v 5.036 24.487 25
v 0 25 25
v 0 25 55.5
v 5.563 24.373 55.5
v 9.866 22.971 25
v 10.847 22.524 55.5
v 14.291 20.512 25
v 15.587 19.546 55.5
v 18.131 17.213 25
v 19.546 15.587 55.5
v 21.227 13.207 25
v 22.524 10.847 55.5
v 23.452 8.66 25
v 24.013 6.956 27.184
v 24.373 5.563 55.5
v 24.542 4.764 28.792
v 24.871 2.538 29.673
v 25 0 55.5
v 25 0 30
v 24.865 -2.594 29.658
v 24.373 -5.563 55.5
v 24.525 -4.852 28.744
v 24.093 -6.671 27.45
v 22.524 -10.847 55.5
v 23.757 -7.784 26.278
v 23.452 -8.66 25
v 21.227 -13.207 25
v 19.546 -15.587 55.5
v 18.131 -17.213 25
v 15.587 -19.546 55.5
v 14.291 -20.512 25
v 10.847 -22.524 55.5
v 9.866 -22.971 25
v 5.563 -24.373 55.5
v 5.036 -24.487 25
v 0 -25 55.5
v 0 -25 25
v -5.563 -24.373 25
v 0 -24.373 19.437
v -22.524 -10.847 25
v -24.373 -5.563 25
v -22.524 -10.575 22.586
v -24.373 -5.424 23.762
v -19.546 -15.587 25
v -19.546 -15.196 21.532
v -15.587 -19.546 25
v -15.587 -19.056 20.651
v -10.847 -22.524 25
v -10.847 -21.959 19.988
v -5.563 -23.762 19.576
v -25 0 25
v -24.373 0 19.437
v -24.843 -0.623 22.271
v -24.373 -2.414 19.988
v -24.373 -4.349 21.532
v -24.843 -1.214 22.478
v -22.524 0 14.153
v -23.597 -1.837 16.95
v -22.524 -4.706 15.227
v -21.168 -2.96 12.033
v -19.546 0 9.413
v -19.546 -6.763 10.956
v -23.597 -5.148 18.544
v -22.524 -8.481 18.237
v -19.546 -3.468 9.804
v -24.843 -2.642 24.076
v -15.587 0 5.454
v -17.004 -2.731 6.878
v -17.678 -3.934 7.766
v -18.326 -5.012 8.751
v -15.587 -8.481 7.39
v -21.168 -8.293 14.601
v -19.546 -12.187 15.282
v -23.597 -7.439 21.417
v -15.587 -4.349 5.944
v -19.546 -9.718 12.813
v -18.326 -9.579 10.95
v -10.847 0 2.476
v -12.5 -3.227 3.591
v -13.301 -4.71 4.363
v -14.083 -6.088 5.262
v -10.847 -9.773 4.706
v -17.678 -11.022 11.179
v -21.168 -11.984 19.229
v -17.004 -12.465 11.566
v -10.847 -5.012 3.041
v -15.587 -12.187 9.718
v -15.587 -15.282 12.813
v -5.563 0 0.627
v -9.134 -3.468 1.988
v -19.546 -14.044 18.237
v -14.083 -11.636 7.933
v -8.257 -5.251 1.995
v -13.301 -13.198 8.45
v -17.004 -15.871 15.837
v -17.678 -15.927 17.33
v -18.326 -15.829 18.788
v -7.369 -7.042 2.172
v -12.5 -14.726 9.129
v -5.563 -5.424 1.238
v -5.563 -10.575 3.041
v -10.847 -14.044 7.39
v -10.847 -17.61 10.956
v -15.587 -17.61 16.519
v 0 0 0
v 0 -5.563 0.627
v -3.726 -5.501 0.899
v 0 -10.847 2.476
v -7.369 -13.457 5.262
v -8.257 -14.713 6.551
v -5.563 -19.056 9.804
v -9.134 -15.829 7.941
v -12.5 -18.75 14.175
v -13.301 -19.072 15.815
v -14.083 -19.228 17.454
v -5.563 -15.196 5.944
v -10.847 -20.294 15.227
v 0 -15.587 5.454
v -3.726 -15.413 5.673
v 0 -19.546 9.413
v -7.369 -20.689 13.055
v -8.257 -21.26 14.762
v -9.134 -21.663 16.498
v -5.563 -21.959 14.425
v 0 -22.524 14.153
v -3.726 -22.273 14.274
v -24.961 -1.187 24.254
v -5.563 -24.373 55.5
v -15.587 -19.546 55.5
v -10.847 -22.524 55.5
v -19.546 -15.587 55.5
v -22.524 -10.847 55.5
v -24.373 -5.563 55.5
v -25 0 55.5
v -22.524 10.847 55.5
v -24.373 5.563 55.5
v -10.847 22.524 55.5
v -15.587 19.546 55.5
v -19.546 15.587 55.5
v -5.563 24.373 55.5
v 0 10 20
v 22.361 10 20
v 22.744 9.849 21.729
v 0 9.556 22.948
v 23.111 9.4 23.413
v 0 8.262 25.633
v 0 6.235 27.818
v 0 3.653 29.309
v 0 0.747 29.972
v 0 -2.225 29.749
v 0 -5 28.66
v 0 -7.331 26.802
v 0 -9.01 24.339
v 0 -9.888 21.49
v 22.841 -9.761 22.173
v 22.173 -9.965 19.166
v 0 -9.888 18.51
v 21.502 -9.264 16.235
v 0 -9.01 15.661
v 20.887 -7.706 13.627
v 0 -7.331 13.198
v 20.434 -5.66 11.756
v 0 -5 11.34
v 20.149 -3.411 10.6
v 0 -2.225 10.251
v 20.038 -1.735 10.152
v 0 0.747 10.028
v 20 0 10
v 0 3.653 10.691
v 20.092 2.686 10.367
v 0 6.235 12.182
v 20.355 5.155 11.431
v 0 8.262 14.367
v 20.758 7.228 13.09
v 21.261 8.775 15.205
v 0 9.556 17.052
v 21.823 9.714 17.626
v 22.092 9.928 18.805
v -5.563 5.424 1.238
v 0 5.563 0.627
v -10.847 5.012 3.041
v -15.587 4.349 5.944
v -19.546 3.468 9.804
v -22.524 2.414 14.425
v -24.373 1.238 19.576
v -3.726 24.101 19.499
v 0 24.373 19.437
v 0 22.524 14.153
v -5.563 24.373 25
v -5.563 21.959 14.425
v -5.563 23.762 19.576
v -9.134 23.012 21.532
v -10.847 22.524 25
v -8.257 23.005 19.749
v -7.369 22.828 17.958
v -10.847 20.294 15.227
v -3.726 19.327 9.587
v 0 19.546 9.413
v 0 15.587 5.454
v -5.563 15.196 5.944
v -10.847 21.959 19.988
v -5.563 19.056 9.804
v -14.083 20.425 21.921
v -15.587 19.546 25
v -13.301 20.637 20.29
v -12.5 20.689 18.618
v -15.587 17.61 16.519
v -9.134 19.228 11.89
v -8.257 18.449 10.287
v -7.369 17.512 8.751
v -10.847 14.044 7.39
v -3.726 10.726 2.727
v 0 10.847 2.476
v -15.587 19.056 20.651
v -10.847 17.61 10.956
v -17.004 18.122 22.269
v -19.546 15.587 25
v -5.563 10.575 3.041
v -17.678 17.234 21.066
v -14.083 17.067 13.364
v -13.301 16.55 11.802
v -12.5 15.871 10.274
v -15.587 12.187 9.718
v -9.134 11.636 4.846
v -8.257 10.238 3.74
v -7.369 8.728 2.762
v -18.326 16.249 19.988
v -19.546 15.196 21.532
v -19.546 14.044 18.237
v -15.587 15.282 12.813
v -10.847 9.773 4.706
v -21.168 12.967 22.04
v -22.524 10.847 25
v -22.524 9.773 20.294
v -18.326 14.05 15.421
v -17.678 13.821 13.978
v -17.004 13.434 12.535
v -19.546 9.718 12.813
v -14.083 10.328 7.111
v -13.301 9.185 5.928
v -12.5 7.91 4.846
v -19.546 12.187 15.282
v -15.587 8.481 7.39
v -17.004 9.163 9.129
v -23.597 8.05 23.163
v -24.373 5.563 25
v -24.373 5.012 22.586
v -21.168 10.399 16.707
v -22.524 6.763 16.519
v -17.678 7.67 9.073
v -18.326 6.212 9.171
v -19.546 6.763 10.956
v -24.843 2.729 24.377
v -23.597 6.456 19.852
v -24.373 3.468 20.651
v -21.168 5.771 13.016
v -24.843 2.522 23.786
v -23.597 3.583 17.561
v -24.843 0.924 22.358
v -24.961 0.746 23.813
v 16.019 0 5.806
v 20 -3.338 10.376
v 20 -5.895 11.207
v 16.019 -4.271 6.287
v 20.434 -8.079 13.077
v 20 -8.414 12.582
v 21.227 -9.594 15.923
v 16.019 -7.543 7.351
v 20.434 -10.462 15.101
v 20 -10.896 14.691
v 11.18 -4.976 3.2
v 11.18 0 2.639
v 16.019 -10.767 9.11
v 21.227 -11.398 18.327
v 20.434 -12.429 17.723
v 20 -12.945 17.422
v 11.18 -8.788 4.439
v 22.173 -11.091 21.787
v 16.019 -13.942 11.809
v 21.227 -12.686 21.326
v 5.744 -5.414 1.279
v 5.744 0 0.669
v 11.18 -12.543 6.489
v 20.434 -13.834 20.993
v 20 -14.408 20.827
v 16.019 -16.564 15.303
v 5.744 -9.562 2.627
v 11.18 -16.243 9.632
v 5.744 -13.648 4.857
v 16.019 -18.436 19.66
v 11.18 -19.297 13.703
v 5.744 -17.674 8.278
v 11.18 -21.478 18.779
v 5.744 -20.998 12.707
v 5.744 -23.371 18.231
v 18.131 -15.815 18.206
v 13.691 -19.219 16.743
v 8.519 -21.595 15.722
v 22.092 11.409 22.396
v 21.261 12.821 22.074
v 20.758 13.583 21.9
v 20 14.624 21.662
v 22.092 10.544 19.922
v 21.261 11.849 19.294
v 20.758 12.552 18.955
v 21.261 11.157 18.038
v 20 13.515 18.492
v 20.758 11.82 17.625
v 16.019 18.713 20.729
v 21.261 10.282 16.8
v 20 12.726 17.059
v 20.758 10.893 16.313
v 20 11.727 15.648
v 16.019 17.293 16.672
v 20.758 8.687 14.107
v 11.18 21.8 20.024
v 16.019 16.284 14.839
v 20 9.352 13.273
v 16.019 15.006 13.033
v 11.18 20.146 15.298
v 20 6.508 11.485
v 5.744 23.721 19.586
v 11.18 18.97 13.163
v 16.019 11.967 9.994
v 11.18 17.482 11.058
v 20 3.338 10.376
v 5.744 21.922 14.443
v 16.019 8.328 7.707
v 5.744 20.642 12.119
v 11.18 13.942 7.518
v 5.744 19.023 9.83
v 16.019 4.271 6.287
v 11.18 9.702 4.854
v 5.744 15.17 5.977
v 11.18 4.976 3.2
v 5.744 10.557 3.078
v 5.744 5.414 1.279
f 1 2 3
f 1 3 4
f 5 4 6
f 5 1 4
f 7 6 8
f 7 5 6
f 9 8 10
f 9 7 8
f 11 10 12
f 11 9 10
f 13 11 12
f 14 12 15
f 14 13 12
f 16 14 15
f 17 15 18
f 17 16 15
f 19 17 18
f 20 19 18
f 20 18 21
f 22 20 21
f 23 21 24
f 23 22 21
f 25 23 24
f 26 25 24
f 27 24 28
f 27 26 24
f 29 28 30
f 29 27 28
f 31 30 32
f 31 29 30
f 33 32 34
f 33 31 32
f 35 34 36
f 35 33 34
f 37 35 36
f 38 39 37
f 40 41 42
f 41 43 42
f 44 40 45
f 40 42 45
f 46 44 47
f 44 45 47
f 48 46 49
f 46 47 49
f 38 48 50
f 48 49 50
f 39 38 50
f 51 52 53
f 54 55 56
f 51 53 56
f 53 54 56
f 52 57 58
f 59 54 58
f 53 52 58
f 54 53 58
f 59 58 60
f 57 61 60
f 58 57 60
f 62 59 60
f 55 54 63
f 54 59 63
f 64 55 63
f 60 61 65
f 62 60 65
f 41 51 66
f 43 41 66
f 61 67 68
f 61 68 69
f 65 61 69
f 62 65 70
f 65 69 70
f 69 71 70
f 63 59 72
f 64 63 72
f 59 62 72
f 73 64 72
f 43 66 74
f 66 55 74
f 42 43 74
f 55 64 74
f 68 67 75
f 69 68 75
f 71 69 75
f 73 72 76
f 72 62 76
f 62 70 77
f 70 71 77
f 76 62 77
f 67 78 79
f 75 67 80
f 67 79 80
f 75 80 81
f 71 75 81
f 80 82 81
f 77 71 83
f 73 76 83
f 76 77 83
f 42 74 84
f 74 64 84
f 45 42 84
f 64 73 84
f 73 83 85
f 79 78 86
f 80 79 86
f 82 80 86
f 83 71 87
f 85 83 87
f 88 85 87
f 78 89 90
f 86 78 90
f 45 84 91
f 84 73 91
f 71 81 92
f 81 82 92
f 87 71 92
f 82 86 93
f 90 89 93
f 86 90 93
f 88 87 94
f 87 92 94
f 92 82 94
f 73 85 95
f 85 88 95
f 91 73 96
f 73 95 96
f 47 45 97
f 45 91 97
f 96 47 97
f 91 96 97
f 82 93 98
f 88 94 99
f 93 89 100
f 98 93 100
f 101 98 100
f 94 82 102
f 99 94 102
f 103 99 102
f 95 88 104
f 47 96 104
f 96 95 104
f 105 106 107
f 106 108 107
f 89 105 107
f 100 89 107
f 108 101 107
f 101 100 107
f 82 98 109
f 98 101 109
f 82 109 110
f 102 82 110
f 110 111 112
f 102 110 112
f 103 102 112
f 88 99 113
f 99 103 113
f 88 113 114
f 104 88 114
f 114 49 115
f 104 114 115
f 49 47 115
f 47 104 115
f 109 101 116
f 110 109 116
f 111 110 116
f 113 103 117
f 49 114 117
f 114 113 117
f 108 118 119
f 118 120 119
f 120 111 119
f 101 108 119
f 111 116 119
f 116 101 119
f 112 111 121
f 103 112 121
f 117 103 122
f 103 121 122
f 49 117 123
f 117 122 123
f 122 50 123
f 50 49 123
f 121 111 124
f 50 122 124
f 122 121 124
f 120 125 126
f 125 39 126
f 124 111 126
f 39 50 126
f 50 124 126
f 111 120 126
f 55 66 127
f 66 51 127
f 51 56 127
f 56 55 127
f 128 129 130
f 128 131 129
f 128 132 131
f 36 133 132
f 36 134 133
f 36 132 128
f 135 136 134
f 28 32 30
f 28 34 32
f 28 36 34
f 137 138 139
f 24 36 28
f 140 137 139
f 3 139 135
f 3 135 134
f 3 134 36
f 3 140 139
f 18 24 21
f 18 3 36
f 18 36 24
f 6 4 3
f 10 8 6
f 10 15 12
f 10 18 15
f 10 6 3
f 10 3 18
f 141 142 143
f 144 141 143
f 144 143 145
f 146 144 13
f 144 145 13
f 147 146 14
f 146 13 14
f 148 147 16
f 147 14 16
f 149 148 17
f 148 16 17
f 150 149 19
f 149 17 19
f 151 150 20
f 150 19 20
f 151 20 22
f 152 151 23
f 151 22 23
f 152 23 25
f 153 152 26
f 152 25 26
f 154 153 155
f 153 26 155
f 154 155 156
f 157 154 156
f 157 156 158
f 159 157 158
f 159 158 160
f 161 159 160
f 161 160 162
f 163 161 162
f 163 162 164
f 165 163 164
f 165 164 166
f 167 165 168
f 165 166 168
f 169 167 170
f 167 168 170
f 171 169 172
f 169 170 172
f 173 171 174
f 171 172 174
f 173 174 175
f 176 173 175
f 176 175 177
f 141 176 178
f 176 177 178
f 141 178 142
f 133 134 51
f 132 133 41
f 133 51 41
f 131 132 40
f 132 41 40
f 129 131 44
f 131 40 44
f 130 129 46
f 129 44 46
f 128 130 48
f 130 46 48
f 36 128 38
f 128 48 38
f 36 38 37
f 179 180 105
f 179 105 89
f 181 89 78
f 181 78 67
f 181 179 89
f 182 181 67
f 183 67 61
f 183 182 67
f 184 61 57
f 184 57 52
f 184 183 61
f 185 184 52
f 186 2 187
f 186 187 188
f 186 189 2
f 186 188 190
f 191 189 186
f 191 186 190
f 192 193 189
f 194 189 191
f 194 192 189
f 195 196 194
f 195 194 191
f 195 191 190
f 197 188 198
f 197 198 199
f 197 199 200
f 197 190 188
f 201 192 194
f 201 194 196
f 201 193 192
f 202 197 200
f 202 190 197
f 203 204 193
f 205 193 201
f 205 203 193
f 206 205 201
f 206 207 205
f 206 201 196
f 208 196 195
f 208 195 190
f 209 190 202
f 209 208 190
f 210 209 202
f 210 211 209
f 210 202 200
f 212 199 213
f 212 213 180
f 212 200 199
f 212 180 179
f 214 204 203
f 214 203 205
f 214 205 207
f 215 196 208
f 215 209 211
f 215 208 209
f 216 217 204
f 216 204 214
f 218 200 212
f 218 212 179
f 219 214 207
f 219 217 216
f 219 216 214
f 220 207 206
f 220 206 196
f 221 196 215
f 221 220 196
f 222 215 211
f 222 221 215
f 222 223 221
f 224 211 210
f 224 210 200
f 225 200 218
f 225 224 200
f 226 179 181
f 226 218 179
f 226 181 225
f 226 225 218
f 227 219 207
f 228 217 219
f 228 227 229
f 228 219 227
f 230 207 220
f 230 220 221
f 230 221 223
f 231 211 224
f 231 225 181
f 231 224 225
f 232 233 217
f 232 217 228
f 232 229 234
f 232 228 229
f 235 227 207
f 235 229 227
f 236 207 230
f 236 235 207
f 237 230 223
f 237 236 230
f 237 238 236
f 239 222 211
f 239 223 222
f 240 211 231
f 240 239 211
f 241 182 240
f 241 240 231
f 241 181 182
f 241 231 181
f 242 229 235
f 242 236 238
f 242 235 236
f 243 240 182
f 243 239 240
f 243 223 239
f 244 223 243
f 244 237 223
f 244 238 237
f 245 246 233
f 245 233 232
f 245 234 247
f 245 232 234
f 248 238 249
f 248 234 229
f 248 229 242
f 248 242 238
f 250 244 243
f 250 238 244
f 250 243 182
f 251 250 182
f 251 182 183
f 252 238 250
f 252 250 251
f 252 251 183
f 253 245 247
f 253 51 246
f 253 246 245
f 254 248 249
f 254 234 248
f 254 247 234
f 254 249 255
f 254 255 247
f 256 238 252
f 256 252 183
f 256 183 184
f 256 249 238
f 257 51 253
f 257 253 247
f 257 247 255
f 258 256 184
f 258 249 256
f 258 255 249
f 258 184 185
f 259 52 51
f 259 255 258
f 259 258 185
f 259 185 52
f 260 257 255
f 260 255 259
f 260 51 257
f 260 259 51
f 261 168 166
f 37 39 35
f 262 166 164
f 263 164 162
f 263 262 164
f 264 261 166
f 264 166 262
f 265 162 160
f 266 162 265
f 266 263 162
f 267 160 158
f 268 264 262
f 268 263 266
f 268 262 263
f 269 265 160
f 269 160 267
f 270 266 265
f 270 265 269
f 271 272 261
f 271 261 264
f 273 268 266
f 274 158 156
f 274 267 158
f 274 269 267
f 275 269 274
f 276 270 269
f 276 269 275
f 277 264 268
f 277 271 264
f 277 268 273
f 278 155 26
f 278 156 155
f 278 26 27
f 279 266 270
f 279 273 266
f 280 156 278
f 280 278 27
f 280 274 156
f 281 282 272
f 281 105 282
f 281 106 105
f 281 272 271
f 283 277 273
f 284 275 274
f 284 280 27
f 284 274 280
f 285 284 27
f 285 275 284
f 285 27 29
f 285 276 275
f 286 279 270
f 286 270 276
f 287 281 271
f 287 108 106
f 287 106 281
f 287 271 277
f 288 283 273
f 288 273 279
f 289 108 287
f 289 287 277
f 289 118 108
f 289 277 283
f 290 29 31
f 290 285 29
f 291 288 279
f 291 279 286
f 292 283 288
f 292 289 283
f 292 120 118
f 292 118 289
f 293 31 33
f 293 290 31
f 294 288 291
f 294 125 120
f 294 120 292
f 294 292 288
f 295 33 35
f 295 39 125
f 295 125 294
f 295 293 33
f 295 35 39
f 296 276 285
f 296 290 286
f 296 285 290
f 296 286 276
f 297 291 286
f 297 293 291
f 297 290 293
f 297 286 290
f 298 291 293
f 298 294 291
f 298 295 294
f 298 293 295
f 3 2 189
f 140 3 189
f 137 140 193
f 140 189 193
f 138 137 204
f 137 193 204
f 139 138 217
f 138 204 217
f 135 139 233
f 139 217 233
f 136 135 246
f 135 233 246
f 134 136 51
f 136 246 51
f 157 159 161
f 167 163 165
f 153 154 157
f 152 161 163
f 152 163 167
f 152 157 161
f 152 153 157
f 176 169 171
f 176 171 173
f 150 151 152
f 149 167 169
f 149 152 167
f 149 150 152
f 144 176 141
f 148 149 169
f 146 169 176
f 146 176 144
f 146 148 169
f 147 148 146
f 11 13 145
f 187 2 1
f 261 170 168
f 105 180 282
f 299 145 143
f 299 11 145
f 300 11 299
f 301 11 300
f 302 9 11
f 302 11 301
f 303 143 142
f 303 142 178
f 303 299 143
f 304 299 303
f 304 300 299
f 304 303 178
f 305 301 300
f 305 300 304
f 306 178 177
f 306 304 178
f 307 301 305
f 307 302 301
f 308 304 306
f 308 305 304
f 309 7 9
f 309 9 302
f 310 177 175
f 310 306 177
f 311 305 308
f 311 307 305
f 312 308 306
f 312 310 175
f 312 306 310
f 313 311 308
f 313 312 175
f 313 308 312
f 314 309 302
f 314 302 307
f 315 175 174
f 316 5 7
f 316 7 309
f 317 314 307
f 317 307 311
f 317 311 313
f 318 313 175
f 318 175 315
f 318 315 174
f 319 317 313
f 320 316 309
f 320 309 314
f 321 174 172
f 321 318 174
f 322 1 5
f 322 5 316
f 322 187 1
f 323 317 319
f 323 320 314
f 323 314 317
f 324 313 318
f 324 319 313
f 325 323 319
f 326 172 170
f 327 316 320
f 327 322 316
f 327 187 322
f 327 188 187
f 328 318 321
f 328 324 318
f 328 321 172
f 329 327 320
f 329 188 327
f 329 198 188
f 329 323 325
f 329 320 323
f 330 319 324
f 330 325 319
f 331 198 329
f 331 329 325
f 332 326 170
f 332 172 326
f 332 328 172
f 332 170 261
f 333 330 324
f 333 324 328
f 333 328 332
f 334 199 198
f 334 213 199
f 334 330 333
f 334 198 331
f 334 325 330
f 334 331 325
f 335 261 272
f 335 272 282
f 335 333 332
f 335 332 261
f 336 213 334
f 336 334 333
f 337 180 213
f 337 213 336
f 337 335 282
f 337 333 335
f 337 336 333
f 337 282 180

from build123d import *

# Parameters (mm, degrees)
F0_W         = 50
F0_H         = 50
F1_DEPTH     = 55.5
F2_R         = 10
F3_DEPTH     = 25
F4_R         = 24.99999
F5_T1_DEPTH  = 155.50001
F5_T3_DEPTH  = 125.00002
F5_T6_ANGLE  = 90
F5_T8_ANGLE  = 90
F5_T10_ANGLE = 90
F5_T12_ANGLE = 90


# Not quite as in the source:
# - a fillet or chamfer that OpenCascade refuses, or shapes differently, is made with other operations: its cross-section is extruded or revolved along the edge and cut away or added
# - a fillet or chamfer is up to 0.001 mm smaller than in the source, because OpenCascade refuses the exact size


with BuildPart() as f1:
    # F0 (on Top) → F1 (new body)
    with BuildSketch(Plane.XY):
        Rectangle(F0_W, F0_H)
    extrude(amount=F1_DEPTH)

    # F2 (on face) → F3 (cut)
    with BuildSketch(Plane.YZ.offset(25)):
        with Locations((0, 20)):
            Circle(F2_R)
    extrude(amount=-F3_DEPTH, mode=Mode.SUBTRACT)

    # F4 (radius 25 in the source; OpenCascade refuses exactly that, so slightly less here)
    f4_edges = [f1.edges().sort_by_distance(p)[0] for p in [
        (0, -25, 0),
        (0, 25, 0),
    ]]
    fillet(f4_edges, radius=F4_R)

    # F5: fillet of radius 25 on 2 edges, made by hand

    # F5_s2 → F5_t1 (cut)
    with BuildSketch(Plane.XY.offset(-37.50001)):
        with BuildLine():
            ThreePointArc((25, 0), (17.6776695297, -17.6776695297), (0, -25))
            Line((0, -25), (25, -25))
            Line((25, -25), (25, 0))
        make_face()
        with BuildLine():
            ThreePointArc((-25, 0), (-17.6776695297, -17.6776695297), (0, -25))
            Line((0, -25), (-25, -25))
            Line((-25, -25), (-25, 0))
        make_face()
        with BuildLine():
            ThreePointArc((0, 25), (-17.6776695297, 17.6776695297), (-25, 0))
            Line((-25, 0), (-25, 25))
            Line((-25, 25), (0, 25))
        make_face()
        with BuildLine():
            ThreePointArc((0, 25), (17.6776695297, 17.6776695297), (25, 0))
            Line((25, 0), (25, 25))
            Line((25, 25), (0, 25))
        make_face()
    extrude(amount=F5_T1_DEPTH, mode=Mode.SUBTRACT)

    # F5_s4 → F5_t3 (cut)
    with BuildSketch(Plane.XZ.offset(-62.50001)):
        with BuildLine():
            ThreePointArc((-25, 25), (-17.6776695297, 7.3223304703), (0, 0))
            Line((0, 0), (-25, 0))
            Line((-25, 0), (-25, 25))
        make_face()
        with BuildLine():
            ThreePointArc((25, 25), (17.6776695297, 7.3223304703), (0, 0))
            Line((0, 0), (25, 0))
            Line((25, 0), (25, 25))
        make_face()
    extrude(amount=F5_T3_DEPTH, mode=Mode.SUBTRACT)

    # F5_s5 → F5_t6 (revolve, cut)
    with BuildSketch(Plane.XZ.offset(1e-05)):
        with BuildLine():
            ThreePointArc((-25, 24.99999), (-17.6776659941, 7.3223269348), (0, 0))
            Line((0, 0), (-25, 0))
            Line((-25, 0), (-25, 24.99999))
        make_face()
    revolve(axis=Axis((-25, -1e-05, 24.99999), (-1, 0, 0)), revolution_arc=F5_T6_ANGLE, mode=Mode.SUBTRACT)

    # F5_s7 → F5_t8 (revolve, cut)
    with BuildSketch(Plane.XY.offset(24.99999)):
        with BuildLine():
            ThreePointArc((0, 25), (-17.6776659941, 17.6776730652), (-25, 1e-05))
            Line((-25, 1e-05), (-25, 25))
            Line((-25, 25), (0, 25))
        make_face()
    revolve(axis=Axis((-25, 1e-05, 24.99999), (-1, 0, 0)), revolution_arc=F5_T8_ANGLE, mode=Mode.SUBTRACT)

    # F5_s9 → F5_t10 (revolve, cut)
    with BuildSketch(Plane.XZ.offset(1e-05)):
        with BuildLine():
            ThreePointArc((25, 24.99999), (17.6776659941, 7.3223269348), (0, 0))
            Line((0, 0), (25, 0))
            Line((25, 0), (25, 24.99999))
        make_face()
    revolve(axis=Axis((25, -1e-05, 24.99999), (-1, 0, 0)), revolution_arc=F5_T10_ANGLE, mode=Mode.SUBTRACT)

    # F5_s11 → F5_t12 (revolve, cut)
    with BuildSketch(Plane.XY.offset(24.99999)):
        with BuildLine():
            ThreePointArc((25, 1e-05), (17.6776659941, 17.6776730652), (0, 25))
            Line((0, 25), (25, 25))
            Line((25, 25), (25, 1e-05))
        make_face()
    revolve(axis=Axis((25, 1e-05, 24.99999), (-1, 0, 0)), revolution_arc=F5_T12_ANGLE, mode=Mode.SUBTRACT)


solid = f1.part
